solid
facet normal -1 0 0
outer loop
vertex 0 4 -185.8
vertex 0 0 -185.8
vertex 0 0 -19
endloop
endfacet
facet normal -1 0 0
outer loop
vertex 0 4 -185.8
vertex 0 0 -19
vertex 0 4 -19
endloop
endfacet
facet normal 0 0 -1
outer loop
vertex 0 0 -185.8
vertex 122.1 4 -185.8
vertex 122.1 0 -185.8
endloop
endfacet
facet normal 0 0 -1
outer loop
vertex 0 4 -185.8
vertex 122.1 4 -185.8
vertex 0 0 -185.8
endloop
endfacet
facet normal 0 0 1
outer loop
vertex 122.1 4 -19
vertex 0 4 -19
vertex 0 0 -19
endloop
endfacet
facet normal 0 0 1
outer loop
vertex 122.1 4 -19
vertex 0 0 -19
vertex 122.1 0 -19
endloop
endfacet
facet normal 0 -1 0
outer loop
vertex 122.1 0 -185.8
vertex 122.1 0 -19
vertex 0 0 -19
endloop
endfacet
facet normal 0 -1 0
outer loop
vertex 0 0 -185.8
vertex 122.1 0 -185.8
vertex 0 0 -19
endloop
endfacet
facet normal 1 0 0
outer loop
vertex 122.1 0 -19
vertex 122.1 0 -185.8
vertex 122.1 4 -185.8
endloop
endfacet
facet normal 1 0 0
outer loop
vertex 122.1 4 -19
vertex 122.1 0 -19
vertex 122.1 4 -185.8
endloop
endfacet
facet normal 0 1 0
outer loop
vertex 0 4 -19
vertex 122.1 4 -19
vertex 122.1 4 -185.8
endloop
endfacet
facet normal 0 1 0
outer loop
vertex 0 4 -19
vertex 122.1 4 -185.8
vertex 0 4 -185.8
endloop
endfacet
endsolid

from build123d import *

# Parameters (mm, degrees)
SKETCH2_W           = 122.1
SKETCH2_H           = 192.8
BOSS_EXTRUDE3_DEPTH = 4
SKETCH3_W           = 122.1
SKETCH3_H           = 4
BOSS_EXTRUDE4_DEPTH = 5
SKETCH4_W           = 213.977787157
SKETCH4_H           = 137.124862953
CUT_EXTRUDE1_DEPTH  = 12
SKETCH5_W           = 196.372741807
SKETCH5_H           = 135.766117788
CUT_EXTRUDE2_DEPTH  = 19


with BuildPart() as part:
    # Sketch2 → Boss-Extrude3 (new body)
    with BuildSketch(Plane(origin=(0, 0, 0), x_dir=(1, 0, 0), z_dir=(0, 1, 0))):
        with Locations((61.05, 96.4)):
            Rectangle(SKETCH2_W, SKETCH2_H)
    extrude(amount=BOSS_EXTRUDE3_DEPTH)

    # Sketch3 → Boss-Extrude4 (add)
    with BuildSketch(Plane(origin=(0, 0, -192.8), x_dir=(-1, 0, 0), z_dir=(0, 0, -1))):
        with Locations((-61.05, 2)):
            Rectangle(SKETCH3_W, SKETCH3_H)
    extrude(amount=BOSS_EXTRUDE4_DEPTH)

    # Sketch4 → Cut-Extrude1 (cut)
    with BuildSketch(Plane(origin=(0, 0, -197.8), x_dir=(-1, 0, 0), z_dir=(0, 0, -1))):
        with Locations((-77.102367238, 6.310456311)):
            Rectangle(SKETCH4_W, SKETCH4_H)
    extrude(amount=-CUT_EXTRUDE1_DEPTH, mode=Mode.SUBTRACT)

    # Sketch5 → Cut-Extrude2 (cut)
    with BuildSketch(Plane.XY):
        with Locations((63.791953285, 8.689014337)):
            Rectangle(SKETCH5_W, SKETCH5_H)
    extrude(amount=-CUT_EXTRUDE2_DEPTH, mode=Mode.SUBTRACT)


solid = part.part
